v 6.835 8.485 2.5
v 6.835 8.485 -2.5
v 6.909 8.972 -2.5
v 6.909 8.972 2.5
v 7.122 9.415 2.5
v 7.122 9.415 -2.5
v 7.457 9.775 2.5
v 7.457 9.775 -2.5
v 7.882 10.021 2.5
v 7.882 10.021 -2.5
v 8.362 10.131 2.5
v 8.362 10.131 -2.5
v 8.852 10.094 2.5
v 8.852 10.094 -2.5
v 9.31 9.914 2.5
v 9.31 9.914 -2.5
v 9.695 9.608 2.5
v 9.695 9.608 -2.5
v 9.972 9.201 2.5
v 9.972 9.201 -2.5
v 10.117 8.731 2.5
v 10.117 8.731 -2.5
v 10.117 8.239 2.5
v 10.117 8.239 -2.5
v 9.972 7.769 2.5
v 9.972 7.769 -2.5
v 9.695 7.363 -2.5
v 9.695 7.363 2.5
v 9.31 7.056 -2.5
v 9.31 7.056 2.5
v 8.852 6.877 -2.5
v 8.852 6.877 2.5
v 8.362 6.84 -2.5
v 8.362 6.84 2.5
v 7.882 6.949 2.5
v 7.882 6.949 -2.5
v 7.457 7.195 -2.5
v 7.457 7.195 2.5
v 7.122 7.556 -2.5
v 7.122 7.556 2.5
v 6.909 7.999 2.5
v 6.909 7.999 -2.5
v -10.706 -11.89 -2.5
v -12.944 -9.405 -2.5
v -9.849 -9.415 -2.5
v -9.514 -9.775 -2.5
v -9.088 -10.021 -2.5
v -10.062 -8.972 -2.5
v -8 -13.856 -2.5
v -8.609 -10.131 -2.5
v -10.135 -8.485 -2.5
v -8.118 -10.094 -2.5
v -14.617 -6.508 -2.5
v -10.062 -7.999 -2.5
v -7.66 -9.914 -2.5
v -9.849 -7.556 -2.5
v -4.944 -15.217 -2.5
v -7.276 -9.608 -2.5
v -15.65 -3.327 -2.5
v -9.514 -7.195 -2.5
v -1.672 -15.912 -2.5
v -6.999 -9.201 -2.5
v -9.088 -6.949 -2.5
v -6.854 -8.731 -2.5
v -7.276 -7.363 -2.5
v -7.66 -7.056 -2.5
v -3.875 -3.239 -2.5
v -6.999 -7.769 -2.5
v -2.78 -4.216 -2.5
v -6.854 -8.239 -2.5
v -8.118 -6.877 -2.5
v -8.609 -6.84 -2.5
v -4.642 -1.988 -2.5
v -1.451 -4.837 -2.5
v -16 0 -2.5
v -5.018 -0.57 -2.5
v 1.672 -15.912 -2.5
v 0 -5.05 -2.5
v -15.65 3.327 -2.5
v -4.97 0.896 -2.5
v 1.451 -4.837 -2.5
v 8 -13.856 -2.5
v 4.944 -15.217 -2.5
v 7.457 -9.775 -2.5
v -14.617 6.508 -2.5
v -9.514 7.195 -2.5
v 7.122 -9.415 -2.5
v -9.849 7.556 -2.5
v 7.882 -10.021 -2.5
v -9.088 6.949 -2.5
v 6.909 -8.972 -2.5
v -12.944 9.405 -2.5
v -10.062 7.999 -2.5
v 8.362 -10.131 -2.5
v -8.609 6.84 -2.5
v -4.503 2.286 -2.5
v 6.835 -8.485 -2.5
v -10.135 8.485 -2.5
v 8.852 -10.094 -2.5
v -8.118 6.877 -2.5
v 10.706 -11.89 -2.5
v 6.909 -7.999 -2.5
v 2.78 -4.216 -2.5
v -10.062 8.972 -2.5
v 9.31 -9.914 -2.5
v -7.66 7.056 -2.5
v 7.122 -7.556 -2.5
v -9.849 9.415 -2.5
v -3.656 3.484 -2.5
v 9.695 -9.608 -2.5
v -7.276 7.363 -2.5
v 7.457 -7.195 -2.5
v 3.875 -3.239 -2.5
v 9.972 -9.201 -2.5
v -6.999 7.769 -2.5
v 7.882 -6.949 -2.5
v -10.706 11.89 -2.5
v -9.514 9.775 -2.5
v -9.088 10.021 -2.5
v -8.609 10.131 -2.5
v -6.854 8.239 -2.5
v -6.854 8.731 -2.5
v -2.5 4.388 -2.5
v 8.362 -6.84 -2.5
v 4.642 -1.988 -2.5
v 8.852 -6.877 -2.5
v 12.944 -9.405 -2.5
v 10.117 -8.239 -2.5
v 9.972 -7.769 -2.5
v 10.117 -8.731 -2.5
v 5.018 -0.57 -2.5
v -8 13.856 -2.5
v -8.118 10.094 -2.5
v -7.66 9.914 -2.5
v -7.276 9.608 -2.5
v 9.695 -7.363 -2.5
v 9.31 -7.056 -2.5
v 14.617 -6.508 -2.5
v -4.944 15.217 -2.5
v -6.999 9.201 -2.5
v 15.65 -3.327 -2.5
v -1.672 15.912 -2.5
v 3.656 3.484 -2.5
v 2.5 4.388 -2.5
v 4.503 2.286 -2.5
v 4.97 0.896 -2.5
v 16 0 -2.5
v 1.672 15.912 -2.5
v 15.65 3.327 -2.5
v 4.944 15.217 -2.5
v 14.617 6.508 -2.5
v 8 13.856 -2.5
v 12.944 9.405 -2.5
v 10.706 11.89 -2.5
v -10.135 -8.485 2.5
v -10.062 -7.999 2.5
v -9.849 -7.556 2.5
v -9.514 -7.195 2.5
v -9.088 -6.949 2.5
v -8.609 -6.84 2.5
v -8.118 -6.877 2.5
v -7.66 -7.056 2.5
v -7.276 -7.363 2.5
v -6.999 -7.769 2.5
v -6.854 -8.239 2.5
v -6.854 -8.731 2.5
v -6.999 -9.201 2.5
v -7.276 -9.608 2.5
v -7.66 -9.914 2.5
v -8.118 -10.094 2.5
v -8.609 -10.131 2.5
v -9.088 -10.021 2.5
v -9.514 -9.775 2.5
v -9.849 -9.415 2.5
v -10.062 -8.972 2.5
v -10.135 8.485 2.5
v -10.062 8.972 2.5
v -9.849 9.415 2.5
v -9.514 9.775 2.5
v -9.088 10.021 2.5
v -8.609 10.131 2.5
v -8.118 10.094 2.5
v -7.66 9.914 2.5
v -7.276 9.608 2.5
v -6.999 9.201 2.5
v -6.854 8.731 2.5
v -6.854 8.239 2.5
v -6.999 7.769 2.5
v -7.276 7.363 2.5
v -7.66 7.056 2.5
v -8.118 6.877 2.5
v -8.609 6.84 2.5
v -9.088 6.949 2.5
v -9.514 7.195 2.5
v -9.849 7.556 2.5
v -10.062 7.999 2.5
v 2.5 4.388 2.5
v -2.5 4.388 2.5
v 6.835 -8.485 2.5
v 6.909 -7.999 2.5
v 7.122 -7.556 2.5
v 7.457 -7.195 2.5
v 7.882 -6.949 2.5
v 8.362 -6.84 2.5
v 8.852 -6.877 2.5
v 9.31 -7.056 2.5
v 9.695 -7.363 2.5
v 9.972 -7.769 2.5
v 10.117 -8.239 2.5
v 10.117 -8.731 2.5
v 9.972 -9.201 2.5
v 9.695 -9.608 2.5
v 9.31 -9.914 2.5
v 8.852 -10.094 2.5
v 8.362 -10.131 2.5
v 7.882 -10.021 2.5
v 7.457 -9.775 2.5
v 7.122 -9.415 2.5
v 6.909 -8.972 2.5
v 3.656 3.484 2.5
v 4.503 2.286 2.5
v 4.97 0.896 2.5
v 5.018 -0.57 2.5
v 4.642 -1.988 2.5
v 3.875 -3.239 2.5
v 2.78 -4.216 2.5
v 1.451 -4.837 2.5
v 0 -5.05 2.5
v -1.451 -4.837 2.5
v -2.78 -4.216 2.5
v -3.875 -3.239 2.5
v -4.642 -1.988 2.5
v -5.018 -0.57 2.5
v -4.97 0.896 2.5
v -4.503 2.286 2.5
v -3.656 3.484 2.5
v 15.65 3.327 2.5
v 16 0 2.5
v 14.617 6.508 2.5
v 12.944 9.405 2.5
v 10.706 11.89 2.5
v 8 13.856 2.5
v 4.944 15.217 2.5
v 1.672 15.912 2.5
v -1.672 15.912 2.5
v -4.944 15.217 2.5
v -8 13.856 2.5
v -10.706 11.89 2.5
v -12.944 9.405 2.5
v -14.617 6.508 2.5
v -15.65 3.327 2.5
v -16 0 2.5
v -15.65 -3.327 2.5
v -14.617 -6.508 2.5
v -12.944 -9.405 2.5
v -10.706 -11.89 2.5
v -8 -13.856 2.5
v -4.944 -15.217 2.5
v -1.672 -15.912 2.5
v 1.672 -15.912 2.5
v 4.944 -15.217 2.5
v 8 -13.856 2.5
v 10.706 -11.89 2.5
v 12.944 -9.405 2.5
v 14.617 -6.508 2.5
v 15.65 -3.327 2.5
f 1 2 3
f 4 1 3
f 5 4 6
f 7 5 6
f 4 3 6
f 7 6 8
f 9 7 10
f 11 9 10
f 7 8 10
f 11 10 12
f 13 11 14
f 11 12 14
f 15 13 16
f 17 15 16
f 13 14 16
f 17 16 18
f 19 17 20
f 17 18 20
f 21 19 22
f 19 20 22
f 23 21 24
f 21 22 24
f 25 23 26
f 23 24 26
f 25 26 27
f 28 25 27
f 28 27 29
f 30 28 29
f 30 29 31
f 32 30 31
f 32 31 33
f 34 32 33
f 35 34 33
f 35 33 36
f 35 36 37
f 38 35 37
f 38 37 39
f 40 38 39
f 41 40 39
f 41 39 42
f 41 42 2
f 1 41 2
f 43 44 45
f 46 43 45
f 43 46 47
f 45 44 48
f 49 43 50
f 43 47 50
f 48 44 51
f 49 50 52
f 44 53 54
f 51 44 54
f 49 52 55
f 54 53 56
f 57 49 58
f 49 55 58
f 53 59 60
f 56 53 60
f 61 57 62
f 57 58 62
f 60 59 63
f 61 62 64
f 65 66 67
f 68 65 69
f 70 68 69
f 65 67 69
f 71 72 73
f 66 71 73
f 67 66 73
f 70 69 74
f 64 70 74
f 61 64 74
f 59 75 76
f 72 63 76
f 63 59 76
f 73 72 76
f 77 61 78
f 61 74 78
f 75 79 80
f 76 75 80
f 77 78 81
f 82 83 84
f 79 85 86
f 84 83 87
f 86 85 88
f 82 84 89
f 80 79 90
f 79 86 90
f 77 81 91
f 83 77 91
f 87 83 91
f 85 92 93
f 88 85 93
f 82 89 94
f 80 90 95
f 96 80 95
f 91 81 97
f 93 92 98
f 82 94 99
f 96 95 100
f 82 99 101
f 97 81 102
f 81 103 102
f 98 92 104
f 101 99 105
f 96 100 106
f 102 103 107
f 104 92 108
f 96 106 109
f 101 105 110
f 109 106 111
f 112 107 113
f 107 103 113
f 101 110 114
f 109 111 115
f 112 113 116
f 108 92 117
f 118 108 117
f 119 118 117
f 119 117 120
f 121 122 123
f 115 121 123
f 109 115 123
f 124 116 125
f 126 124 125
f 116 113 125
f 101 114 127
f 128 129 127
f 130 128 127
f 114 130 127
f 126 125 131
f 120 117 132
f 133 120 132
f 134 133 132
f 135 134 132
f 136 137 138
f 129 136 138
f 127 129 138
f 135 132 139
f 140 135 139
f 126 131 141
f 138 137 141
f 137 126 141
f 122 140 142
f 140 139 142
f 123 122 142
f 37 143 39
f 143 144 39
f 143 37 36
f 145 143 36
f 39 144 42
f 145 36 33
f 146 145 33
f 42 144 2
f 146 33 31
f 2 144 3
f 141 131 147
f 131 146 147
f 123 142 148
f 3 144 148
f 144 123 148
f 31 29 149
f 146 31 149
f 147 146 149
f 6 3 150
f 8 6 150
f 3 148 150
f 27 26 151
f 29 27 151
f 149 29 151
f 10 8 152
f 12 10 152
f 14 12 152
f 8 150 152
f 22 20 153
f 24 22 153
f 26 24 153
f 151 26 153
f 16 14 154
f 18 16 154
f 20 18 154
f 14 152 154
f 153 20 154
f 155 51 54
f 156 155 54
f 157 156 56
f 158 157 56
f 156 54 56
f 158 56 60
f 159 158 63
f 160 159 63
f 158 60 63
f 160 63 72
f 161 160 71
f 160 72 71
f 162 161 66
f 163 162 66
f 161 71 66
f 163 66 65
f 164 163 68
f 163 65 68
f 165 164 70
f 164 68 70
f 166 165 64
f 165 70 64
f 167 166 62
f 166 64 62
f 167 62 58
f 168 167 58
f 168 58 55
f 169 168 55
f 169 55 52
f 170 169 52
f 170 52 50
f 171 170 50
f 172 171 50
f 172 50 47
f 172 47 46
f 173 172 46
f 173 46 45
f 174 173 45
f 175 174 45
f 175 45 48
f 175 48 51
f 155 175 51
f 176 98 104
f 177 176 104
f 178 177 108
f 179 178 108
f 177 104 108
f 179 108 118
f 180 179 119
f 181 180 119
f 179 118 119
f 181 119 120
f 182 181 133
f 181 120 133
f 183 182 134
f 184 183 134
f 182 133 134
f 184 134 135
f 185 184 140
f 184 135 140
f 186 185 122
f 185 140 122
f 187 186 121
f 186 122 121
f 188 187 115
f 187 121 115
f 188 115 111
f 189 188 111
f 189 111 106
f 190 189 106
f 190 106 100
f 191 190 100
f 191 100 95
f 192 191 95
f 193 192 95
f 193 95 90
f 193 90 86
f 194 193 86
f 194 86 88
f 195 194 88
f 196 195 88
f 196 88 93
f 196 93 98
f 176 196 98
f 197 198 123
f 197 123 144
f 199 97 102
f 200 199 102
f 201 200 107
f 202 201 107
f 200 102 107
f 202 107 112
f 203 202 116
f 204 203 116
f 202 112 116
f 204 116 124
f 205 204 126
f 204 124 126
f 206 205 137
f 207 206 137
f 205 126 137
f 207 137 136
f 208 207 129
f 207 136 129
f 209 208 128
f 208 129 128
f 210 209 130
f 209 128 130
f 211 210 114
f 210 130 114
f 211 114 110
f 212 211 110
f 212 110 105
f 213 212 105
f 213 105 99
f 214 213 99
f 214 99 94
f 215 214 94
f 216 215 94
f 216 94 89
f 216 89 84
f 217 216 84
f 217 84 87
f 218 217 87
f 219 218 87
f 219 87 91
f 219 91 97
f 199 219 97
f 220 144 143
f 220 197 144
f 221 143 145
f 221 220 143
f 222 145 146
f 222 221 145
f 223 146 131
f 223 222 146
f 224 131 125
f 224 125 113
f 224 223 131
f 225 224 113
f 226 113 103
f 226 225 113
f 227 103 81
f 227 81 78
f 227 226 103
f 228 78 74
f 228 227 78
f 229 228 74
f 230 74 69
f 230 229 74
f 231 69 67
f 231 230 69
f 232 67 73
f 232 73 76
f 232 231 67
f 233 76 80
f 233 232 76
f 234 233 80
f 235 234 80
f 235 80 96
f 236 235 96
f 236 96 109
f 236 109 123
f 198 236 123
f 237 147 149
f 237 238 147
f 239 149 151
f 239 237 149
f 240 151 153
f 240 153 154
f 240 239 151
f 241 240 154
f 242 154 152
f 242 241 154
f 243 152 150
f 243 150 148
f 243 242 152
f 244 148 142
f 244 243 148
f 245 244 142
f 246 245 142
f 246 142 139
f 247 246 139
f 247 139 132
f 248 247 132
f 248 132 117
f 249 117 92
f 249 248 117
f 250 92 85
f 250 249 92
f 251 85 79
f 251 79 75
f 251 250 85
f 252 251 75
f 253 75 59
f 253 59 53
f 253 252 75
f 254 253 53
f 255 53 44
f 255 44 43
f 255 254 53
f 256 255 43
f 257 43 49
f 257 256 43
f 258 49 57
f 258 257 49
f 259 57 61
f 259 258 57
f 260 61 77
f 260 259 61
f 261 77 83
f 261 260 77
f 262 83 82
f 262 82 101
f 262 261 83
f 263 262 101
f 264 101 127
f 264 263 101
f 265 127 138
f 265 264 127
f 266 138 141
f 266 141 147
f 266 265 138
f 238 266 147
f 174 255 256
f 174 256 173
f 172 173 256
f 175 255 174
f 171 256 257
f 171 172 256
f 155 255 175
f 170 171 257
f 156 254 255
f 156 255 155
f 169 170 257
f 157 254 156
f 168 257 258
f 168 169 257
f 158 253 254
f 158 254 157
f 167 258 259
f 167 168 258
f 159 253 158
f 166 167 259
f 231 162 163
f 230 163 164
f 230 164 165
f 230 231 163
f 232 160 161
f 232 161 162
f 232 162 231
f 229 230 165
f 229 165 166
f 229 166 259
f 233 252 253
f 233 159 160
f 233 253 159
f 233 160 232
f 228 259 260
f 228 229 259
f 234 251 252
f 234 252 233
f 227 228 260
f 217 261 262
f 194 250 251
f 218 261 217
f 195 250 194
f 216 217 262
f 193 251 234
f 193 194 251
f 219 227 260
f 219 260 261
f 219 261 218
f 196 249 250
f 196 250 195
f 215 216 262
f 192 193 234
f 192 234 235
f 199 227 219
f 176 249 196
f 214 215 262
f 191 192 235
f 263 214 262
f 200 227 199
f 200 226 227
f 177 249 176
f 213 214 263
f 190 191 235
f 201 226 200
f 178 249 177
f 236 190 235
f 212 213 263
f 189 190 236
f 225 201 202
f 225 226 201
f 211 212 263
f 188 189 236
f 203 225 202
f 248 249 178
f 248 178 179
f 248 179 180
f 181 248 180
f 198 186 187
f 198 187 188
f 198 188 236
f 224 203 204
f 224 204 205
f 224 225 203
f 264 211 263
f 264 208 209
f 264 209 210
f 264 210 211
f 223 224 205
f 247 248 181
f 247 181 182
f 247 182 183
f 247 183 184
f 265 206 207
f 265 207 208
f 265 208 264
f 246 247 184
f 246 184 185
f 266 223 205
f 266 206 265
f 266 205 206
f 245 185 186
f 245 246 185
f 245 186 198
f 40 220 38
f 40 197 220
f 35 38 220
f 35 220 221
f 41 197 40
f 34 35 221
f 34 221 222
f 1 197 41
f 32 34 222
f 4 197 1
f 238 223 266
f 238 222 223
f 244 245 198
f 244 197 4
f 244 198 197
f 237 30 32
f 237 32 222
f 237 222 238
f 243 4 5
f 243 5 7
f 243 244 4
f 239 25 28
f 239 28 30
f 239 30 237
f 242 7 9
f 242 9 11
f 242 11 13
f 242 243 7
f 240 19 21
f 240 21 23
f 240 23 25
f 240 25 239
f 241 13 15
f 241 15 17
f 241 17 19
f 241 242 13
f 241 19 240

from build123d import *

# Parameters (mm, degrees)
SKETCH1_R                   = 16
BOSS_EXTRUDE1_DEPTH         = 2.5
TAP_DRILL_FOR_M4X0_7_TAP1_D = 3.3


with BuildPart() as part:
    # Sketch1 → Boss-Extrude1 (new body, symmetric)
    with BuildSketch(Plane.XY):
        Circle(SKETCH1_R)
        with BuildLine():
            Line((-2.5, 4.387767086), (2.5, 4.387767086))
            ThreePointArc((2.5, 4.387767086), (0, -5.05), (-2.5, 4.387767086))
        make_face(mode=Mode.SUBTRACT)
    extrude(amount=BOSS_EXTRUDE1_DEPTH, both=True)

    # Tap Drill for M4x0.7 Tap1 (through all)
    with Locations(Plane.XY.offset(2.5)):
        with Locations((8.485281374, 8.485281374), (-8.485281374, 8.485281374), (-8.485281374, -8.485281374), (8.485281374, -8.485281374)):
            Hole(TAP_DRILL_FOR_M4X0_7_TAP1_D / 2)


solid = part.part
